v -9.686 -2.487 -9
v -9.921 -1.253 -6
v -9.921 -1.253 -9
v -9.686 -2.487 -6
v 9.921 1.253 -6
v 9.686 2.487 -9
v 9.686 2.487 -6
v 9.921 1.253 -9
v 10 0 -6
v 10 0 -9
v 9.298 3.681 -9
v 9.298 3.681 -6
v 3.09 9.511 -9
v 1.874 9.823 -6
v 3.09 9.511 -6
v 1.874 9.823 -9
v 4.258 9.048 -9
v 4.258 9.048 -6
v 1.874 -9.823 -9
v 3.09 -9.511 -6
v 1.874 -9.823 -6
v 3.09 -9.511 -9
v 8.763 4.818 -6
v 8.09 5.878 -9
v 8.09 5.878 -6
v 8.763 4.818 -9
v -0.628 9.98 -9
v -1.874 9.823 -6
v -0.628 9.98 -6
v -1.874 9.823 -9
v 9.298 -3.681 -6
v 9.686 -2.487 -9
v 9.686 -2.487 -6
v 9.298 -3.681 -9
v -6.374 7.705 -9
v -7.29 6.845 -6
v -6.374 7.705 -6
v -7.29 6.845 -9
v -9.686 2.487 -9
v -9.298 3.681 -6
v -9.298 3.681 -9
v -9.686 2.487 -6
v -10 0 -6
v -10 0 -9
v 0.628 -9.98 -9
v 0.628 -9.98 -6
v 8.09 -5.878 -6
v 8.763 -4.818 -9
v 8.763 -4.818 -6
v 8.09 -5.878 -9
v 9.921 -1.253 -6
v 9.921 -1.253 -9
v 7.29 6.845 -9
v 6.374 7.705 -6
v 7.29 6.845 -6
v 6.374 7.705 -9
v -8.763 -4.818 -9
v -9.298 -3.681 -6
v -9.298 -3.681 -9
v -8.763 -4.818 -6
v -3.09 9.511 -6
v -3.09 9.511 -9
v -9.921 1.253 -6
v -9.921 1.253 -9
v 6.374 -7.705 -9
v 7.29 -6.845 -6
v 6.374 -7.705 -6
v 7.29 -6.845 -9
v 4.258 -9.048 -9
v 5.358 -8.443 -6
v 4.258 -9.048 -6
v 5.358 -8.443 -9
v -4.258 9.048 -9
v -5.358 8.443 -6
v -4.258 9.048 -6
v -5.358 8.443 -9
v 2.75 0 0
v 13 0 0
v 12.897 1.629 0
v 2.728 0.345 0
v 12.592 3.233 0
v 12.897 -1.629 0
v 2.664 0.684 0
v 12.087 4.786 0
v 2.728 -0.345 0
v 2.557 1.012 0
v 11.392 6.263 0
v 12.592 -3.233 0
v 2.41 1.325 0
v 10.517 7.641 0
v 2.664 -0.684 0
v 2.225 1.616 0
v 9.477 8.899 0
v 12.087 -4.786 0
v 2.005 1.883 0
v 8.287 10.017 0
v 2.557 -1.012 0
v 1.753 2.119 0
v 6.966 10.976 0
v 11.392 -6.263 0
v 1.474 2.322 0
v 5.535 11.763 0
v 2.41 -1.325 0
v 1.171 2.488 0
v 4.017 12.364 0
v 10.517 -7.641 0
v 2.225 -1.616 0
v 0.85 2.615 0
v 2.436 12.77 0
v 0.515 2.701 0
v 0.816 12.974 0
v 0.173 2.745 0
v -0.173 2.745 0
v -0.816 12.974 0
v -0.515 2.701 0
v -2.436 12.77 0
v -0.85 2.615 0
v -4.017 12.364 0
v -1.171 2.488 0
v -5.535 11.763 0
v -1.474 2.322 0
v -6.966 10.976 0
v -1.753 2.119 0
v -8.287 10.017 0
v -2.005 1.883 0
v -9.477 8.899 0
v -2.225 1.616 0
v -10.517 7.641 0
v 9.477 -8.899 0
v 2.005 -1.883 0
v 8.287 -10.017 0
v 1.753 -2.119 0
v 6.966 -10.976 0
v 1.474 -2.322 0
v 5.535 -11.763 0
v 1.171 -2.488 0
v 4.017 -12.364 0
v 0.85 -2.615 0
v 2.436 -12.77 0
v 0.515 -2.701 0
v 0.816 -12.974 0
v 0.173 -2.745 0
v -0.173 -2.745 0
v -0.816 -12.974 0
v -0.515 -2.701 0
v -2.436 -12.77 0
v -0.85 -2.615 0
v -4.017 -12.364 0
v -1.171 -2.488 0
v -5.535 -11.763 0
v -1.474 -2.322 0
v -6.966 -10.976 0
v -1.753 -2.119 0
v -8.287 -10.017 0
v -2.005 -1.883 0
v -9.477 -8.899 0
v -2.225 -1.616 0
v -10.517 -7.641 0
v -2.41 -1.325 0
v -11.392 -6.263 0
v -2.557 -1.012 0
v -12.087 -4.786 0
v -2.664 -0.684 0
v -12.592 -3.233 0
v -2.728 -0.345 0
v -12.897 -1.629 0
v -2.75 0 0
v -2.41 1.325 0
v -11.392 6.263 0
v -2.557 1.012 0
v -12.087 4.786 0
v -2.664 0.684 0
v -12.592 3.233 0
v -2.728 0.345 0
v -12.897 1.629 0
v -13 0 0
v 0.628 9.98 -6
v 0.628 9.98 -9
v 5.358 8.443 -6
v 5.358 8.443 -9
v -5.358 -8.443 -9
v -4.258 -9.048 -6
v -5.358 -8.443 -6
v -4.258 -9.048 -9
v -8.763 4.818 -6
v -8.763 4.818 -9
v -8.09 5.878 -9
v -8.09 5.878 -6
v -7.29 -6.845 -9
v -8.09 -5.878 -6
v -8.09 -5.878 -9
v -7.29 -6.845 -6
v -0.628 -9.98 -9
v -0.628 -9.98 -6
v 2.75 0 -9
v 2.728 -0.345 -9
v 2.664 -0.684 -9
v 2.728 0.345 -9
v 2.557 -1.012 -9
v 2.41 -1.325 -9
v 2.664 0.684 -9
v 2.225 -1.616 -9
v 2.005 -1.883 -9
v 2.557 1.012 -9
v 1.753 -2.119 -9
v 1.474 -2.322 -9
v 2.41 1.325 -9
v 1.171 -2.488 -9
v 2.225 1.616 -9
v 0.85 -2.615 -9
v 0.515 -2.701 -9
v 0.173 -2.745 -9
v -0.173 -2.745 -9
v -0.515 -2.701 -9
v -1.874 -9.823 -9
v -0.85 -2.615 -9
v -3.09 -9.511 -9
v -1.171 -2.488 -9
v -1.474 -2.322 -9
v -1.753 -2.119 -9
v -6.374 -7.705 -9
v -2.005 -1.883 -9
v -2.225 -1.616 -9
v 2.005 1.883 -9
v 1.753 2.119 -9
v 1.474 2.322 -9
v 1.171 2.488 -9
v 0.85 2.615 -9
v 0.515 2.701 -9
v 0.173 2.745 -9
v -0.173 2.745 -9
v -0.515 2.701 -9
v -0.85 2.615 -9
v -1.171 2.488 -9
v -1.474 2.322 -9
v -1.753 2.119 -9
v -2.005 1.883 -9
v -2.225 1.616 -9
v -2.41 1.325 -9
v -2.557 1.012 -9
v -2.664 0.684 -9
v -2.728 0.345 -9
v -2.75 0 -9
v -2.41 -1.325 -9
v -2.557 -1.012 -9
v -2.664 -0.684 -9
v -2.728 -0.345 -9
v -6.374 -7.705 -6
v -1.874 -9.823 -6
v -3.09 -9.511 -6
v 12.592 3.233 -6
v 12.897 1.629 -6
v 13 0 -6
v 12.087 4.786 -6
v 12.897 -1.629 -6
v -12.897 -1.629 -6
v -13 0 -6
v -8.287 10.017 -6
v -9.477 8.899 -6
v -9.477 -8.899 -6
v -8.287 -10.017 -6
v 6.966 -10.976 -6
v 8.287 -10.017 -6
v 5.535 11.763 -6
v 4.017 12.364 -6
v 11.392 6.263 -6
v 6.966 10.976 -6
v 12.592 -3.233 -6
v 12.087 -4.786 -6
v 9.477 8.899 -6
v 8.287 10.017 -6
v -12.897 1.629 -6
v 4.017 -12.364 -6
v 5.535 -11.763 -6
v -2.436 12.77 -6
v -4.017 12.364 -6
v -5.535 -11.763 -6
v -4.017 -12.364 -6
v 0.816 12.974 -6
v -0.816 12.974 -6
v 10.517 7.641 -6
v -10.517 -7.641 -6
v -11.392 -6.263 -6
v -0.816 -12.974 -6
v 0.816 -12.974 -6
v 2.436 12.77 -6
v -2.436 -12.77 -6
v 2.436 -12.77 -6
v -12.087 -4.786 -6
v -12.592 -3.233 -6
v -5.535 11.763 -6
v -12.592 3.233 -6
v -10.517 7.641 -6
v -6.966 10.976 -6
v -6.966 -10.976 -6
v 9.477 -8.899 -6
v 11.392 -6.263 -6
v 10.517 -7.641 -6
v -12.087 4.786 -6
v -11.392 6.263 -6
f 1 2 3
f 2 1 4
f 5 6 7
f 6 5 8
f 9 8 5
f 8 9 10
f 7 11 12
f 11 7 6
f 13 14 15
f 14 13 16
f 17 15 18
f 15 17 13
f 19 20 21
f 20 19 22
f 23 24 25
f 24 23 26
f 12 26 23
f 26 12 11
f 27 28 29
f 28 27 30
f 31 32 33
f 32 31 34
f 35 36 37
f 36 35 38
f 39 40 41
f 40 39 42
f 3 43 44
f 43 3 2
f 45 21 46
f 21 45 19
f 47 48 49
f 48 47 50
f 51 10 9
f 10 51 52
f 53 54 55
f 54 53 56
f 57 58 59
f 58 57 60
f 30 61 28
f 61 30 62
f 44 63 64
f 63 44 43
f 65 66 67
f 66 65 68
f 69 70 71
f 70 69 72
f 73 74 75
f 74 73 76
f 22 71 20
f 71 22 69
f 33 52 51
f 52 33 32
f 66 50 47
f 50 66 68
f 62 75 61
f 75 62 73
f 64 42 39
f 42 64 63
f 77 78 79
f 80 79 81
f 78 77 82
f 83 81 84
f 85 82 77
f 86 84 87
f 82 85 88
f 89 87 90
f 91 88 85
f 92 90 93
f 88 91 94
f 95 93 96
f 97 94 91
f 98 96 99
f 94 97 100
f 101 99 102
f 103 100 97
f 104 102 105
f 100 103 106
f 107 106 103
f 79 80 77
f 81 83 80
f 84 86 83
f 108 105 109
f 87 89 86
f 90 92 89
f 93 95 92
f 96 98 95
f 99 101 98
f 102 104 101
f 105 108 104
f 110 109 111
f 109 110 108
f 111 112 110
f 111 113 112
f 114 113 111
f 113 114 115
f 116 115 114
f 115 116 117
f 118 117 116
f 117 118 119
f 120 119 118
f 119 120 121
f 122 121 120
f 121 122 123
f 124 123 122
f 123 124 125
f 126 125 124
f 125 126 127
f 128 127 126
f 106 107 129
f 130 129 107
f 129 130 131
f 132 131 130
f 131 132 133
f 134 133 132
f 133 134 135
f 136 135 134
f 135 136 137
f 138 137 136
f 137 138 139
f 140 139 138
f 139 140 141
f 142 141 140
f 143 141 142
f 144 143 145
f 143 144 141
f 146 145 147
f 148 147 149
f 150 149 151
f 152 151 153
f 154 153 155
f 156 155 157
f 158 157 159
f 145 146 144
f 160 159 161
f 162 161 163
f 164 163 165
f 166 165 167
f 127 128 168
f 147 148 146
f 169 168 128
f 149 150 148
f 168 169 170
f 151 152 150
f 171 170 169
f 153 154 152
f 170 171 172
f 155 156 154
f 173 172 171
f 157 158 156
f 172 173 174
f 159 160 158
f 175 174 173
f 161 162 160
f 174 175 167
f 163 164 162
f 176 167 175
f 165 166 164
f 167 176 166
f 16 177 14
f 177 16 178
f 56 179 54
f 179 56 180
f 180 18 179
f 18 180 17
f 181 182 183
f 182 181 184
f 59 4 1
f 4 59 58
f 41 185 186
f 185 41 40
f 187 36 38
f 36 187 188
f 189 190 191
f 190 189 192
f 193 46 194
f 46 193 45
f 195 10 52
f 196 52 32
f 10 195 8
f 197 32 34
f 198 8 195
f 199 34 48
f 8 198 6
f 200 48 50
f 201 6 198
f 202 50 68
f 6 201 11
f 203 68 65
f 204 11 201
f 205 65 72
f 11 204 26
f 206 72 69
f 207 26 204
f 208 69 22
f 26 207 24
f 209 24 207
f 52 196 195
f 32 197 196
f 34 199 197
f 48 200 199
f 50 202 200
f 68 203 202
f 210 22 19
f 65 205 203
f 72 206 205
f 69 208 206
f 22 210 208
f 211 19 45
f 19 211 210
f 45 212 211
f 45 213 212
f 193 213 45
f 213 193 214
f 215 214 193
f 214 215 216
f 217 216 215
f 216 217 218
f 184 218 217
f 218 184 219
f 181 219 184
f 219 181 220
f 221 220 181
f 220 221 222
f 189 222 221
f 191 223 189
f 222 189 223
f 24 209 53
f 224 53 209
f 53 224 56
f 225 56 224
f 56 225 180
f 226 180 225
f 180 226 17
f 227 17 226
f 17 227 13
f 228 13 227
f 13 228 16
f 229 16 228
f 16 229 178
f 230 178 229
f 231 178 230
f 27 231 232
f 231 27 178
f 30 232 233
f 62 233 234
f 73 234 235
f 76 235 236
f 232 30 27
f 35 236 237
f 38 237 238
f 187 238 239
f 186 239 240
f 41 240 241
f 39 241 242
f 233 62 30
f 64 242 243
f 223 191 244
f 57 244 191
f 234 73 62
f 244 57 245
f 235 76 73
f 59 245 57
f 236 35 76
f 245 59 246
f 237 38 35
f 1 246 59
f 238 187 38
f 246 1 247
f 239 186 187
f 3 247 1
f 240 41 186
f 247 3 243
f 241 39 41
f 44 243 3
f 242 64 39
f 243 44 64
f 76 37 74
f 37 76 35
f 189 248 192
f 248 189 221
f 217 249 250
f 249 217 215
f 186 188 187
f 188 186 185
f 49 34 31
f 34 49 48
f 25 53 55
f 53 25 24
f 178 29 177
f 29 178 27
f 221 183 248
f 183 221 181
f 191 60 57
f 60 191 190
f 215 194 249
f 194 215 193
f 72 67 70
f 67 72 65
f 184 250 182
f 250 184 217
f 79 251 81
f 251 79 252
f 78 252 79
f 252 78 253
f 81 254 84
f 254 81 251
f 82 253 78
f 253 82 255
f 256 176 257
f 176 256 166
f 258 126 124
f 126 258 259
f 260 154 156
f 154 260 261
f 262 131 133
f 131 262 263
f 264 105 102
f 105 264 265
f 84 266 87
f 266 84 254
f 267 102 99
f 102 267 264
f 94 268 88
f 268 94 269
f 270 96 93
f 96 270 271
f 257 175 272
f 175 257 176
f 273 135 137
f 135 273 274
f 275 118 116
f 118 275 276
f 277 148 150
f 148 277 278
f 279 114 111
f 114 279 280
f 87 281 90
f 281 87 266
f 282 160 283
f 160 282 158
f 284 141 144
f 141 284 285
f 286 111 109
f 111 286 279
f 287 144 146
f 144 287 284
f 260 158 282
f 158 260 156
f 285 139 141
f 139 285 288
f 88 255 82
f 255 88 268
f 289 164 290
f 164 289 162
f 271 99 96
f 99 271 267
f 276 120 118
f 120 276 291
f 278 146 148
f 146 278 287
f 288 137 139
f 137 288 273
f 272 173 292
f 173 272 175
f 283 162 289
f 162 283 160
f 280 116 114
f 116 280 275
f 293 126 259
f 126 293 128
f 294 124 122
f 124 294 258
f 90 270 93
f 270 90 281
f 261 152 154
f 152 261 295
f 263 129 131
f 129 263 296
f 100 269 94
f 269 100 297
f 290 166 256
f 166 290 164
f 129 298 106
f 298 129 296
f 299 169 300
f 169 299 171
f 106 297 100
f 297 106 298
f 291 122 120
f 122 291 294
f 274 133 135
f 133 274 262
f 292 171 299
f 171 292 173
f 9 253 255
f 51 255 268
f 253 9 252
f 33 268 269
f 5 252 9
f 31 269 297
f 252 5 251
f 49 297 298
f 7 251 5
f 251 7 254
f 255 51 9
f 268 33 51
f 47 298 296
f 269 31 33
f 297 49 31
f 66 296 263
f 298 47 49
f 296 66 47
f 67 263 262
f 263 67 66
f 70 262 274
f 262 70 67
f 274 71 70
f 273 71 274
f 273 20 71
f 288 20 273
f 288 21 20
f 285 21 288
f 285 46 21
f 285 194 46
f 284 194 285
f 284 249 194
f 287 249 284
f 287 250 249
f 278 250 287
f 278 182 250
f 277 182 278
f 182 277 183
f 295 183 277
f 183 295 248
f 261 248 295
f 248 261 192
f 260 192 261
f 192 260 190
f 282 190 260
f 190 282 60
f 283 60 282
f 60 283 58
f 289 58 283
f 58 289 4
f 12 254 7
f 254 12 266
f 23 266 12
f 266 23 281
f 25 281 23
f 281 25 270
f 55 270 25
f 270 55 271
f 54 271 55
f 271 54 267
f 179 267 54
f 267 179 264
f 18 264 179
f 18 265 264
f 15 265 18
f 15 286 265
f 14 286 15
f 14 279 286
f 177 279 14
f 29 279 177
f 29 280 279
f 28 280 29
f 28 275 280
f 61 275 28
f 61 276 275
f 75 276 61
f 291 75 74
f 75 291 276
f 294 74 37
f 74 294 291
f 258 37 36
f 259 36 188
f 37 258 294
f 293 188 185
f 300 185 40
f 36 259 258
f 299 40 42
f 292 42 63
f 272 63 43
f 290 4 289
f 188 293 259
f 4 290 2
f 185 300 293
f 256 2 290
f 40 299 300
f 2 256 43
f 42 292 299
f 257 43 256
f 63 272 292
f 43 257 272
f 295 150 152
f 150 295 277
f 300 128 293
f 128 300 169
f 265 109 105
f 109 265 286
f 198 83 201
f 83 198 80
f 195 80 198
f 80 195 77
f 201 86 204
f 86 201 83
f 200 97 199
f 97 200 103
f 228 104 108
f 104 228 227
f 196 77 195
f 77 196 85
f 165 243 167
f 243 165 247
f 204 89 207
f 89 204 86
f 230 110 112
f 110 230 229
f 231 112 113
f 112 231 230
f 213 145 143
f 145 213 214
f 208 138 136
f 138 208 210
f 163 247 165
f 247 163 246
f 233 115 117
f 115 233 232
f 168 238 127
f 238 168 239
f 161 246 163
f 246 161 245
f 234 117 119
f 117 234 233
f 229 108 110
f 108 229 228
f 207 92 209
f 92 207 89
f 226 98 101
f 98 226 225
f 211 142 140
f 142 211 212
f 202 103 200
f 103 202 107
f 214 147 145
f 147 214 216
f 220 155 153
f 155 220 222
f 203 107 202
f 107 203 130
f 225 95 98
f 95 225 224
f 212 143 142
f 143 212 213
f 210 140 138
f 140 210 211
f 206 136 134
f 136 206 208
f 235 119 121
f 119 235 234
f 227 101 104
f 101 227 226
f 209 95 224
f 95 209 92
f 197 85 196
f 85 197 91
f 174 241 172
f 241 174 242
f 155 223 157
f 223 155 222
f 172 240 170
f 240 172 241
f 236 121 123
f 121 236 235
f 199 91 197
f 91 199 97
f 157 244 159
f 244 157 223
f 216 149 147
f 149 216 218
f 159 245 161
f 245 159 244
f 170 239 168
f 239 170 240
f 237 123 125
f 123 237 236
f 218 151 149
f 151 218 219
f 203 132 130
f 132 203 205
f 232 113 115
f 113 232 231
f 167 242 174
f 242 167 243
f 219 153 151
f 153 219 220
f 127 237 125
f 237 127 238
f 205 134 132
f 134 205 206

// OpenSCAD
$fn = 50;


difference() {
	union() {
		translate(v = [0, 0, -9.0000000000]) {
			cylinder(h = 9, r = 10.0000000000);
		}
		translate(v = [0, 0, -6.0000000000]) {
			cylinder(h = 6, r = 13.0000000000);
		}
	}
	union() {
		#translate(v = [0, 0, -9]) {
			cylinder(h = 9, r = 2.7500000000);
		}
	}
}
